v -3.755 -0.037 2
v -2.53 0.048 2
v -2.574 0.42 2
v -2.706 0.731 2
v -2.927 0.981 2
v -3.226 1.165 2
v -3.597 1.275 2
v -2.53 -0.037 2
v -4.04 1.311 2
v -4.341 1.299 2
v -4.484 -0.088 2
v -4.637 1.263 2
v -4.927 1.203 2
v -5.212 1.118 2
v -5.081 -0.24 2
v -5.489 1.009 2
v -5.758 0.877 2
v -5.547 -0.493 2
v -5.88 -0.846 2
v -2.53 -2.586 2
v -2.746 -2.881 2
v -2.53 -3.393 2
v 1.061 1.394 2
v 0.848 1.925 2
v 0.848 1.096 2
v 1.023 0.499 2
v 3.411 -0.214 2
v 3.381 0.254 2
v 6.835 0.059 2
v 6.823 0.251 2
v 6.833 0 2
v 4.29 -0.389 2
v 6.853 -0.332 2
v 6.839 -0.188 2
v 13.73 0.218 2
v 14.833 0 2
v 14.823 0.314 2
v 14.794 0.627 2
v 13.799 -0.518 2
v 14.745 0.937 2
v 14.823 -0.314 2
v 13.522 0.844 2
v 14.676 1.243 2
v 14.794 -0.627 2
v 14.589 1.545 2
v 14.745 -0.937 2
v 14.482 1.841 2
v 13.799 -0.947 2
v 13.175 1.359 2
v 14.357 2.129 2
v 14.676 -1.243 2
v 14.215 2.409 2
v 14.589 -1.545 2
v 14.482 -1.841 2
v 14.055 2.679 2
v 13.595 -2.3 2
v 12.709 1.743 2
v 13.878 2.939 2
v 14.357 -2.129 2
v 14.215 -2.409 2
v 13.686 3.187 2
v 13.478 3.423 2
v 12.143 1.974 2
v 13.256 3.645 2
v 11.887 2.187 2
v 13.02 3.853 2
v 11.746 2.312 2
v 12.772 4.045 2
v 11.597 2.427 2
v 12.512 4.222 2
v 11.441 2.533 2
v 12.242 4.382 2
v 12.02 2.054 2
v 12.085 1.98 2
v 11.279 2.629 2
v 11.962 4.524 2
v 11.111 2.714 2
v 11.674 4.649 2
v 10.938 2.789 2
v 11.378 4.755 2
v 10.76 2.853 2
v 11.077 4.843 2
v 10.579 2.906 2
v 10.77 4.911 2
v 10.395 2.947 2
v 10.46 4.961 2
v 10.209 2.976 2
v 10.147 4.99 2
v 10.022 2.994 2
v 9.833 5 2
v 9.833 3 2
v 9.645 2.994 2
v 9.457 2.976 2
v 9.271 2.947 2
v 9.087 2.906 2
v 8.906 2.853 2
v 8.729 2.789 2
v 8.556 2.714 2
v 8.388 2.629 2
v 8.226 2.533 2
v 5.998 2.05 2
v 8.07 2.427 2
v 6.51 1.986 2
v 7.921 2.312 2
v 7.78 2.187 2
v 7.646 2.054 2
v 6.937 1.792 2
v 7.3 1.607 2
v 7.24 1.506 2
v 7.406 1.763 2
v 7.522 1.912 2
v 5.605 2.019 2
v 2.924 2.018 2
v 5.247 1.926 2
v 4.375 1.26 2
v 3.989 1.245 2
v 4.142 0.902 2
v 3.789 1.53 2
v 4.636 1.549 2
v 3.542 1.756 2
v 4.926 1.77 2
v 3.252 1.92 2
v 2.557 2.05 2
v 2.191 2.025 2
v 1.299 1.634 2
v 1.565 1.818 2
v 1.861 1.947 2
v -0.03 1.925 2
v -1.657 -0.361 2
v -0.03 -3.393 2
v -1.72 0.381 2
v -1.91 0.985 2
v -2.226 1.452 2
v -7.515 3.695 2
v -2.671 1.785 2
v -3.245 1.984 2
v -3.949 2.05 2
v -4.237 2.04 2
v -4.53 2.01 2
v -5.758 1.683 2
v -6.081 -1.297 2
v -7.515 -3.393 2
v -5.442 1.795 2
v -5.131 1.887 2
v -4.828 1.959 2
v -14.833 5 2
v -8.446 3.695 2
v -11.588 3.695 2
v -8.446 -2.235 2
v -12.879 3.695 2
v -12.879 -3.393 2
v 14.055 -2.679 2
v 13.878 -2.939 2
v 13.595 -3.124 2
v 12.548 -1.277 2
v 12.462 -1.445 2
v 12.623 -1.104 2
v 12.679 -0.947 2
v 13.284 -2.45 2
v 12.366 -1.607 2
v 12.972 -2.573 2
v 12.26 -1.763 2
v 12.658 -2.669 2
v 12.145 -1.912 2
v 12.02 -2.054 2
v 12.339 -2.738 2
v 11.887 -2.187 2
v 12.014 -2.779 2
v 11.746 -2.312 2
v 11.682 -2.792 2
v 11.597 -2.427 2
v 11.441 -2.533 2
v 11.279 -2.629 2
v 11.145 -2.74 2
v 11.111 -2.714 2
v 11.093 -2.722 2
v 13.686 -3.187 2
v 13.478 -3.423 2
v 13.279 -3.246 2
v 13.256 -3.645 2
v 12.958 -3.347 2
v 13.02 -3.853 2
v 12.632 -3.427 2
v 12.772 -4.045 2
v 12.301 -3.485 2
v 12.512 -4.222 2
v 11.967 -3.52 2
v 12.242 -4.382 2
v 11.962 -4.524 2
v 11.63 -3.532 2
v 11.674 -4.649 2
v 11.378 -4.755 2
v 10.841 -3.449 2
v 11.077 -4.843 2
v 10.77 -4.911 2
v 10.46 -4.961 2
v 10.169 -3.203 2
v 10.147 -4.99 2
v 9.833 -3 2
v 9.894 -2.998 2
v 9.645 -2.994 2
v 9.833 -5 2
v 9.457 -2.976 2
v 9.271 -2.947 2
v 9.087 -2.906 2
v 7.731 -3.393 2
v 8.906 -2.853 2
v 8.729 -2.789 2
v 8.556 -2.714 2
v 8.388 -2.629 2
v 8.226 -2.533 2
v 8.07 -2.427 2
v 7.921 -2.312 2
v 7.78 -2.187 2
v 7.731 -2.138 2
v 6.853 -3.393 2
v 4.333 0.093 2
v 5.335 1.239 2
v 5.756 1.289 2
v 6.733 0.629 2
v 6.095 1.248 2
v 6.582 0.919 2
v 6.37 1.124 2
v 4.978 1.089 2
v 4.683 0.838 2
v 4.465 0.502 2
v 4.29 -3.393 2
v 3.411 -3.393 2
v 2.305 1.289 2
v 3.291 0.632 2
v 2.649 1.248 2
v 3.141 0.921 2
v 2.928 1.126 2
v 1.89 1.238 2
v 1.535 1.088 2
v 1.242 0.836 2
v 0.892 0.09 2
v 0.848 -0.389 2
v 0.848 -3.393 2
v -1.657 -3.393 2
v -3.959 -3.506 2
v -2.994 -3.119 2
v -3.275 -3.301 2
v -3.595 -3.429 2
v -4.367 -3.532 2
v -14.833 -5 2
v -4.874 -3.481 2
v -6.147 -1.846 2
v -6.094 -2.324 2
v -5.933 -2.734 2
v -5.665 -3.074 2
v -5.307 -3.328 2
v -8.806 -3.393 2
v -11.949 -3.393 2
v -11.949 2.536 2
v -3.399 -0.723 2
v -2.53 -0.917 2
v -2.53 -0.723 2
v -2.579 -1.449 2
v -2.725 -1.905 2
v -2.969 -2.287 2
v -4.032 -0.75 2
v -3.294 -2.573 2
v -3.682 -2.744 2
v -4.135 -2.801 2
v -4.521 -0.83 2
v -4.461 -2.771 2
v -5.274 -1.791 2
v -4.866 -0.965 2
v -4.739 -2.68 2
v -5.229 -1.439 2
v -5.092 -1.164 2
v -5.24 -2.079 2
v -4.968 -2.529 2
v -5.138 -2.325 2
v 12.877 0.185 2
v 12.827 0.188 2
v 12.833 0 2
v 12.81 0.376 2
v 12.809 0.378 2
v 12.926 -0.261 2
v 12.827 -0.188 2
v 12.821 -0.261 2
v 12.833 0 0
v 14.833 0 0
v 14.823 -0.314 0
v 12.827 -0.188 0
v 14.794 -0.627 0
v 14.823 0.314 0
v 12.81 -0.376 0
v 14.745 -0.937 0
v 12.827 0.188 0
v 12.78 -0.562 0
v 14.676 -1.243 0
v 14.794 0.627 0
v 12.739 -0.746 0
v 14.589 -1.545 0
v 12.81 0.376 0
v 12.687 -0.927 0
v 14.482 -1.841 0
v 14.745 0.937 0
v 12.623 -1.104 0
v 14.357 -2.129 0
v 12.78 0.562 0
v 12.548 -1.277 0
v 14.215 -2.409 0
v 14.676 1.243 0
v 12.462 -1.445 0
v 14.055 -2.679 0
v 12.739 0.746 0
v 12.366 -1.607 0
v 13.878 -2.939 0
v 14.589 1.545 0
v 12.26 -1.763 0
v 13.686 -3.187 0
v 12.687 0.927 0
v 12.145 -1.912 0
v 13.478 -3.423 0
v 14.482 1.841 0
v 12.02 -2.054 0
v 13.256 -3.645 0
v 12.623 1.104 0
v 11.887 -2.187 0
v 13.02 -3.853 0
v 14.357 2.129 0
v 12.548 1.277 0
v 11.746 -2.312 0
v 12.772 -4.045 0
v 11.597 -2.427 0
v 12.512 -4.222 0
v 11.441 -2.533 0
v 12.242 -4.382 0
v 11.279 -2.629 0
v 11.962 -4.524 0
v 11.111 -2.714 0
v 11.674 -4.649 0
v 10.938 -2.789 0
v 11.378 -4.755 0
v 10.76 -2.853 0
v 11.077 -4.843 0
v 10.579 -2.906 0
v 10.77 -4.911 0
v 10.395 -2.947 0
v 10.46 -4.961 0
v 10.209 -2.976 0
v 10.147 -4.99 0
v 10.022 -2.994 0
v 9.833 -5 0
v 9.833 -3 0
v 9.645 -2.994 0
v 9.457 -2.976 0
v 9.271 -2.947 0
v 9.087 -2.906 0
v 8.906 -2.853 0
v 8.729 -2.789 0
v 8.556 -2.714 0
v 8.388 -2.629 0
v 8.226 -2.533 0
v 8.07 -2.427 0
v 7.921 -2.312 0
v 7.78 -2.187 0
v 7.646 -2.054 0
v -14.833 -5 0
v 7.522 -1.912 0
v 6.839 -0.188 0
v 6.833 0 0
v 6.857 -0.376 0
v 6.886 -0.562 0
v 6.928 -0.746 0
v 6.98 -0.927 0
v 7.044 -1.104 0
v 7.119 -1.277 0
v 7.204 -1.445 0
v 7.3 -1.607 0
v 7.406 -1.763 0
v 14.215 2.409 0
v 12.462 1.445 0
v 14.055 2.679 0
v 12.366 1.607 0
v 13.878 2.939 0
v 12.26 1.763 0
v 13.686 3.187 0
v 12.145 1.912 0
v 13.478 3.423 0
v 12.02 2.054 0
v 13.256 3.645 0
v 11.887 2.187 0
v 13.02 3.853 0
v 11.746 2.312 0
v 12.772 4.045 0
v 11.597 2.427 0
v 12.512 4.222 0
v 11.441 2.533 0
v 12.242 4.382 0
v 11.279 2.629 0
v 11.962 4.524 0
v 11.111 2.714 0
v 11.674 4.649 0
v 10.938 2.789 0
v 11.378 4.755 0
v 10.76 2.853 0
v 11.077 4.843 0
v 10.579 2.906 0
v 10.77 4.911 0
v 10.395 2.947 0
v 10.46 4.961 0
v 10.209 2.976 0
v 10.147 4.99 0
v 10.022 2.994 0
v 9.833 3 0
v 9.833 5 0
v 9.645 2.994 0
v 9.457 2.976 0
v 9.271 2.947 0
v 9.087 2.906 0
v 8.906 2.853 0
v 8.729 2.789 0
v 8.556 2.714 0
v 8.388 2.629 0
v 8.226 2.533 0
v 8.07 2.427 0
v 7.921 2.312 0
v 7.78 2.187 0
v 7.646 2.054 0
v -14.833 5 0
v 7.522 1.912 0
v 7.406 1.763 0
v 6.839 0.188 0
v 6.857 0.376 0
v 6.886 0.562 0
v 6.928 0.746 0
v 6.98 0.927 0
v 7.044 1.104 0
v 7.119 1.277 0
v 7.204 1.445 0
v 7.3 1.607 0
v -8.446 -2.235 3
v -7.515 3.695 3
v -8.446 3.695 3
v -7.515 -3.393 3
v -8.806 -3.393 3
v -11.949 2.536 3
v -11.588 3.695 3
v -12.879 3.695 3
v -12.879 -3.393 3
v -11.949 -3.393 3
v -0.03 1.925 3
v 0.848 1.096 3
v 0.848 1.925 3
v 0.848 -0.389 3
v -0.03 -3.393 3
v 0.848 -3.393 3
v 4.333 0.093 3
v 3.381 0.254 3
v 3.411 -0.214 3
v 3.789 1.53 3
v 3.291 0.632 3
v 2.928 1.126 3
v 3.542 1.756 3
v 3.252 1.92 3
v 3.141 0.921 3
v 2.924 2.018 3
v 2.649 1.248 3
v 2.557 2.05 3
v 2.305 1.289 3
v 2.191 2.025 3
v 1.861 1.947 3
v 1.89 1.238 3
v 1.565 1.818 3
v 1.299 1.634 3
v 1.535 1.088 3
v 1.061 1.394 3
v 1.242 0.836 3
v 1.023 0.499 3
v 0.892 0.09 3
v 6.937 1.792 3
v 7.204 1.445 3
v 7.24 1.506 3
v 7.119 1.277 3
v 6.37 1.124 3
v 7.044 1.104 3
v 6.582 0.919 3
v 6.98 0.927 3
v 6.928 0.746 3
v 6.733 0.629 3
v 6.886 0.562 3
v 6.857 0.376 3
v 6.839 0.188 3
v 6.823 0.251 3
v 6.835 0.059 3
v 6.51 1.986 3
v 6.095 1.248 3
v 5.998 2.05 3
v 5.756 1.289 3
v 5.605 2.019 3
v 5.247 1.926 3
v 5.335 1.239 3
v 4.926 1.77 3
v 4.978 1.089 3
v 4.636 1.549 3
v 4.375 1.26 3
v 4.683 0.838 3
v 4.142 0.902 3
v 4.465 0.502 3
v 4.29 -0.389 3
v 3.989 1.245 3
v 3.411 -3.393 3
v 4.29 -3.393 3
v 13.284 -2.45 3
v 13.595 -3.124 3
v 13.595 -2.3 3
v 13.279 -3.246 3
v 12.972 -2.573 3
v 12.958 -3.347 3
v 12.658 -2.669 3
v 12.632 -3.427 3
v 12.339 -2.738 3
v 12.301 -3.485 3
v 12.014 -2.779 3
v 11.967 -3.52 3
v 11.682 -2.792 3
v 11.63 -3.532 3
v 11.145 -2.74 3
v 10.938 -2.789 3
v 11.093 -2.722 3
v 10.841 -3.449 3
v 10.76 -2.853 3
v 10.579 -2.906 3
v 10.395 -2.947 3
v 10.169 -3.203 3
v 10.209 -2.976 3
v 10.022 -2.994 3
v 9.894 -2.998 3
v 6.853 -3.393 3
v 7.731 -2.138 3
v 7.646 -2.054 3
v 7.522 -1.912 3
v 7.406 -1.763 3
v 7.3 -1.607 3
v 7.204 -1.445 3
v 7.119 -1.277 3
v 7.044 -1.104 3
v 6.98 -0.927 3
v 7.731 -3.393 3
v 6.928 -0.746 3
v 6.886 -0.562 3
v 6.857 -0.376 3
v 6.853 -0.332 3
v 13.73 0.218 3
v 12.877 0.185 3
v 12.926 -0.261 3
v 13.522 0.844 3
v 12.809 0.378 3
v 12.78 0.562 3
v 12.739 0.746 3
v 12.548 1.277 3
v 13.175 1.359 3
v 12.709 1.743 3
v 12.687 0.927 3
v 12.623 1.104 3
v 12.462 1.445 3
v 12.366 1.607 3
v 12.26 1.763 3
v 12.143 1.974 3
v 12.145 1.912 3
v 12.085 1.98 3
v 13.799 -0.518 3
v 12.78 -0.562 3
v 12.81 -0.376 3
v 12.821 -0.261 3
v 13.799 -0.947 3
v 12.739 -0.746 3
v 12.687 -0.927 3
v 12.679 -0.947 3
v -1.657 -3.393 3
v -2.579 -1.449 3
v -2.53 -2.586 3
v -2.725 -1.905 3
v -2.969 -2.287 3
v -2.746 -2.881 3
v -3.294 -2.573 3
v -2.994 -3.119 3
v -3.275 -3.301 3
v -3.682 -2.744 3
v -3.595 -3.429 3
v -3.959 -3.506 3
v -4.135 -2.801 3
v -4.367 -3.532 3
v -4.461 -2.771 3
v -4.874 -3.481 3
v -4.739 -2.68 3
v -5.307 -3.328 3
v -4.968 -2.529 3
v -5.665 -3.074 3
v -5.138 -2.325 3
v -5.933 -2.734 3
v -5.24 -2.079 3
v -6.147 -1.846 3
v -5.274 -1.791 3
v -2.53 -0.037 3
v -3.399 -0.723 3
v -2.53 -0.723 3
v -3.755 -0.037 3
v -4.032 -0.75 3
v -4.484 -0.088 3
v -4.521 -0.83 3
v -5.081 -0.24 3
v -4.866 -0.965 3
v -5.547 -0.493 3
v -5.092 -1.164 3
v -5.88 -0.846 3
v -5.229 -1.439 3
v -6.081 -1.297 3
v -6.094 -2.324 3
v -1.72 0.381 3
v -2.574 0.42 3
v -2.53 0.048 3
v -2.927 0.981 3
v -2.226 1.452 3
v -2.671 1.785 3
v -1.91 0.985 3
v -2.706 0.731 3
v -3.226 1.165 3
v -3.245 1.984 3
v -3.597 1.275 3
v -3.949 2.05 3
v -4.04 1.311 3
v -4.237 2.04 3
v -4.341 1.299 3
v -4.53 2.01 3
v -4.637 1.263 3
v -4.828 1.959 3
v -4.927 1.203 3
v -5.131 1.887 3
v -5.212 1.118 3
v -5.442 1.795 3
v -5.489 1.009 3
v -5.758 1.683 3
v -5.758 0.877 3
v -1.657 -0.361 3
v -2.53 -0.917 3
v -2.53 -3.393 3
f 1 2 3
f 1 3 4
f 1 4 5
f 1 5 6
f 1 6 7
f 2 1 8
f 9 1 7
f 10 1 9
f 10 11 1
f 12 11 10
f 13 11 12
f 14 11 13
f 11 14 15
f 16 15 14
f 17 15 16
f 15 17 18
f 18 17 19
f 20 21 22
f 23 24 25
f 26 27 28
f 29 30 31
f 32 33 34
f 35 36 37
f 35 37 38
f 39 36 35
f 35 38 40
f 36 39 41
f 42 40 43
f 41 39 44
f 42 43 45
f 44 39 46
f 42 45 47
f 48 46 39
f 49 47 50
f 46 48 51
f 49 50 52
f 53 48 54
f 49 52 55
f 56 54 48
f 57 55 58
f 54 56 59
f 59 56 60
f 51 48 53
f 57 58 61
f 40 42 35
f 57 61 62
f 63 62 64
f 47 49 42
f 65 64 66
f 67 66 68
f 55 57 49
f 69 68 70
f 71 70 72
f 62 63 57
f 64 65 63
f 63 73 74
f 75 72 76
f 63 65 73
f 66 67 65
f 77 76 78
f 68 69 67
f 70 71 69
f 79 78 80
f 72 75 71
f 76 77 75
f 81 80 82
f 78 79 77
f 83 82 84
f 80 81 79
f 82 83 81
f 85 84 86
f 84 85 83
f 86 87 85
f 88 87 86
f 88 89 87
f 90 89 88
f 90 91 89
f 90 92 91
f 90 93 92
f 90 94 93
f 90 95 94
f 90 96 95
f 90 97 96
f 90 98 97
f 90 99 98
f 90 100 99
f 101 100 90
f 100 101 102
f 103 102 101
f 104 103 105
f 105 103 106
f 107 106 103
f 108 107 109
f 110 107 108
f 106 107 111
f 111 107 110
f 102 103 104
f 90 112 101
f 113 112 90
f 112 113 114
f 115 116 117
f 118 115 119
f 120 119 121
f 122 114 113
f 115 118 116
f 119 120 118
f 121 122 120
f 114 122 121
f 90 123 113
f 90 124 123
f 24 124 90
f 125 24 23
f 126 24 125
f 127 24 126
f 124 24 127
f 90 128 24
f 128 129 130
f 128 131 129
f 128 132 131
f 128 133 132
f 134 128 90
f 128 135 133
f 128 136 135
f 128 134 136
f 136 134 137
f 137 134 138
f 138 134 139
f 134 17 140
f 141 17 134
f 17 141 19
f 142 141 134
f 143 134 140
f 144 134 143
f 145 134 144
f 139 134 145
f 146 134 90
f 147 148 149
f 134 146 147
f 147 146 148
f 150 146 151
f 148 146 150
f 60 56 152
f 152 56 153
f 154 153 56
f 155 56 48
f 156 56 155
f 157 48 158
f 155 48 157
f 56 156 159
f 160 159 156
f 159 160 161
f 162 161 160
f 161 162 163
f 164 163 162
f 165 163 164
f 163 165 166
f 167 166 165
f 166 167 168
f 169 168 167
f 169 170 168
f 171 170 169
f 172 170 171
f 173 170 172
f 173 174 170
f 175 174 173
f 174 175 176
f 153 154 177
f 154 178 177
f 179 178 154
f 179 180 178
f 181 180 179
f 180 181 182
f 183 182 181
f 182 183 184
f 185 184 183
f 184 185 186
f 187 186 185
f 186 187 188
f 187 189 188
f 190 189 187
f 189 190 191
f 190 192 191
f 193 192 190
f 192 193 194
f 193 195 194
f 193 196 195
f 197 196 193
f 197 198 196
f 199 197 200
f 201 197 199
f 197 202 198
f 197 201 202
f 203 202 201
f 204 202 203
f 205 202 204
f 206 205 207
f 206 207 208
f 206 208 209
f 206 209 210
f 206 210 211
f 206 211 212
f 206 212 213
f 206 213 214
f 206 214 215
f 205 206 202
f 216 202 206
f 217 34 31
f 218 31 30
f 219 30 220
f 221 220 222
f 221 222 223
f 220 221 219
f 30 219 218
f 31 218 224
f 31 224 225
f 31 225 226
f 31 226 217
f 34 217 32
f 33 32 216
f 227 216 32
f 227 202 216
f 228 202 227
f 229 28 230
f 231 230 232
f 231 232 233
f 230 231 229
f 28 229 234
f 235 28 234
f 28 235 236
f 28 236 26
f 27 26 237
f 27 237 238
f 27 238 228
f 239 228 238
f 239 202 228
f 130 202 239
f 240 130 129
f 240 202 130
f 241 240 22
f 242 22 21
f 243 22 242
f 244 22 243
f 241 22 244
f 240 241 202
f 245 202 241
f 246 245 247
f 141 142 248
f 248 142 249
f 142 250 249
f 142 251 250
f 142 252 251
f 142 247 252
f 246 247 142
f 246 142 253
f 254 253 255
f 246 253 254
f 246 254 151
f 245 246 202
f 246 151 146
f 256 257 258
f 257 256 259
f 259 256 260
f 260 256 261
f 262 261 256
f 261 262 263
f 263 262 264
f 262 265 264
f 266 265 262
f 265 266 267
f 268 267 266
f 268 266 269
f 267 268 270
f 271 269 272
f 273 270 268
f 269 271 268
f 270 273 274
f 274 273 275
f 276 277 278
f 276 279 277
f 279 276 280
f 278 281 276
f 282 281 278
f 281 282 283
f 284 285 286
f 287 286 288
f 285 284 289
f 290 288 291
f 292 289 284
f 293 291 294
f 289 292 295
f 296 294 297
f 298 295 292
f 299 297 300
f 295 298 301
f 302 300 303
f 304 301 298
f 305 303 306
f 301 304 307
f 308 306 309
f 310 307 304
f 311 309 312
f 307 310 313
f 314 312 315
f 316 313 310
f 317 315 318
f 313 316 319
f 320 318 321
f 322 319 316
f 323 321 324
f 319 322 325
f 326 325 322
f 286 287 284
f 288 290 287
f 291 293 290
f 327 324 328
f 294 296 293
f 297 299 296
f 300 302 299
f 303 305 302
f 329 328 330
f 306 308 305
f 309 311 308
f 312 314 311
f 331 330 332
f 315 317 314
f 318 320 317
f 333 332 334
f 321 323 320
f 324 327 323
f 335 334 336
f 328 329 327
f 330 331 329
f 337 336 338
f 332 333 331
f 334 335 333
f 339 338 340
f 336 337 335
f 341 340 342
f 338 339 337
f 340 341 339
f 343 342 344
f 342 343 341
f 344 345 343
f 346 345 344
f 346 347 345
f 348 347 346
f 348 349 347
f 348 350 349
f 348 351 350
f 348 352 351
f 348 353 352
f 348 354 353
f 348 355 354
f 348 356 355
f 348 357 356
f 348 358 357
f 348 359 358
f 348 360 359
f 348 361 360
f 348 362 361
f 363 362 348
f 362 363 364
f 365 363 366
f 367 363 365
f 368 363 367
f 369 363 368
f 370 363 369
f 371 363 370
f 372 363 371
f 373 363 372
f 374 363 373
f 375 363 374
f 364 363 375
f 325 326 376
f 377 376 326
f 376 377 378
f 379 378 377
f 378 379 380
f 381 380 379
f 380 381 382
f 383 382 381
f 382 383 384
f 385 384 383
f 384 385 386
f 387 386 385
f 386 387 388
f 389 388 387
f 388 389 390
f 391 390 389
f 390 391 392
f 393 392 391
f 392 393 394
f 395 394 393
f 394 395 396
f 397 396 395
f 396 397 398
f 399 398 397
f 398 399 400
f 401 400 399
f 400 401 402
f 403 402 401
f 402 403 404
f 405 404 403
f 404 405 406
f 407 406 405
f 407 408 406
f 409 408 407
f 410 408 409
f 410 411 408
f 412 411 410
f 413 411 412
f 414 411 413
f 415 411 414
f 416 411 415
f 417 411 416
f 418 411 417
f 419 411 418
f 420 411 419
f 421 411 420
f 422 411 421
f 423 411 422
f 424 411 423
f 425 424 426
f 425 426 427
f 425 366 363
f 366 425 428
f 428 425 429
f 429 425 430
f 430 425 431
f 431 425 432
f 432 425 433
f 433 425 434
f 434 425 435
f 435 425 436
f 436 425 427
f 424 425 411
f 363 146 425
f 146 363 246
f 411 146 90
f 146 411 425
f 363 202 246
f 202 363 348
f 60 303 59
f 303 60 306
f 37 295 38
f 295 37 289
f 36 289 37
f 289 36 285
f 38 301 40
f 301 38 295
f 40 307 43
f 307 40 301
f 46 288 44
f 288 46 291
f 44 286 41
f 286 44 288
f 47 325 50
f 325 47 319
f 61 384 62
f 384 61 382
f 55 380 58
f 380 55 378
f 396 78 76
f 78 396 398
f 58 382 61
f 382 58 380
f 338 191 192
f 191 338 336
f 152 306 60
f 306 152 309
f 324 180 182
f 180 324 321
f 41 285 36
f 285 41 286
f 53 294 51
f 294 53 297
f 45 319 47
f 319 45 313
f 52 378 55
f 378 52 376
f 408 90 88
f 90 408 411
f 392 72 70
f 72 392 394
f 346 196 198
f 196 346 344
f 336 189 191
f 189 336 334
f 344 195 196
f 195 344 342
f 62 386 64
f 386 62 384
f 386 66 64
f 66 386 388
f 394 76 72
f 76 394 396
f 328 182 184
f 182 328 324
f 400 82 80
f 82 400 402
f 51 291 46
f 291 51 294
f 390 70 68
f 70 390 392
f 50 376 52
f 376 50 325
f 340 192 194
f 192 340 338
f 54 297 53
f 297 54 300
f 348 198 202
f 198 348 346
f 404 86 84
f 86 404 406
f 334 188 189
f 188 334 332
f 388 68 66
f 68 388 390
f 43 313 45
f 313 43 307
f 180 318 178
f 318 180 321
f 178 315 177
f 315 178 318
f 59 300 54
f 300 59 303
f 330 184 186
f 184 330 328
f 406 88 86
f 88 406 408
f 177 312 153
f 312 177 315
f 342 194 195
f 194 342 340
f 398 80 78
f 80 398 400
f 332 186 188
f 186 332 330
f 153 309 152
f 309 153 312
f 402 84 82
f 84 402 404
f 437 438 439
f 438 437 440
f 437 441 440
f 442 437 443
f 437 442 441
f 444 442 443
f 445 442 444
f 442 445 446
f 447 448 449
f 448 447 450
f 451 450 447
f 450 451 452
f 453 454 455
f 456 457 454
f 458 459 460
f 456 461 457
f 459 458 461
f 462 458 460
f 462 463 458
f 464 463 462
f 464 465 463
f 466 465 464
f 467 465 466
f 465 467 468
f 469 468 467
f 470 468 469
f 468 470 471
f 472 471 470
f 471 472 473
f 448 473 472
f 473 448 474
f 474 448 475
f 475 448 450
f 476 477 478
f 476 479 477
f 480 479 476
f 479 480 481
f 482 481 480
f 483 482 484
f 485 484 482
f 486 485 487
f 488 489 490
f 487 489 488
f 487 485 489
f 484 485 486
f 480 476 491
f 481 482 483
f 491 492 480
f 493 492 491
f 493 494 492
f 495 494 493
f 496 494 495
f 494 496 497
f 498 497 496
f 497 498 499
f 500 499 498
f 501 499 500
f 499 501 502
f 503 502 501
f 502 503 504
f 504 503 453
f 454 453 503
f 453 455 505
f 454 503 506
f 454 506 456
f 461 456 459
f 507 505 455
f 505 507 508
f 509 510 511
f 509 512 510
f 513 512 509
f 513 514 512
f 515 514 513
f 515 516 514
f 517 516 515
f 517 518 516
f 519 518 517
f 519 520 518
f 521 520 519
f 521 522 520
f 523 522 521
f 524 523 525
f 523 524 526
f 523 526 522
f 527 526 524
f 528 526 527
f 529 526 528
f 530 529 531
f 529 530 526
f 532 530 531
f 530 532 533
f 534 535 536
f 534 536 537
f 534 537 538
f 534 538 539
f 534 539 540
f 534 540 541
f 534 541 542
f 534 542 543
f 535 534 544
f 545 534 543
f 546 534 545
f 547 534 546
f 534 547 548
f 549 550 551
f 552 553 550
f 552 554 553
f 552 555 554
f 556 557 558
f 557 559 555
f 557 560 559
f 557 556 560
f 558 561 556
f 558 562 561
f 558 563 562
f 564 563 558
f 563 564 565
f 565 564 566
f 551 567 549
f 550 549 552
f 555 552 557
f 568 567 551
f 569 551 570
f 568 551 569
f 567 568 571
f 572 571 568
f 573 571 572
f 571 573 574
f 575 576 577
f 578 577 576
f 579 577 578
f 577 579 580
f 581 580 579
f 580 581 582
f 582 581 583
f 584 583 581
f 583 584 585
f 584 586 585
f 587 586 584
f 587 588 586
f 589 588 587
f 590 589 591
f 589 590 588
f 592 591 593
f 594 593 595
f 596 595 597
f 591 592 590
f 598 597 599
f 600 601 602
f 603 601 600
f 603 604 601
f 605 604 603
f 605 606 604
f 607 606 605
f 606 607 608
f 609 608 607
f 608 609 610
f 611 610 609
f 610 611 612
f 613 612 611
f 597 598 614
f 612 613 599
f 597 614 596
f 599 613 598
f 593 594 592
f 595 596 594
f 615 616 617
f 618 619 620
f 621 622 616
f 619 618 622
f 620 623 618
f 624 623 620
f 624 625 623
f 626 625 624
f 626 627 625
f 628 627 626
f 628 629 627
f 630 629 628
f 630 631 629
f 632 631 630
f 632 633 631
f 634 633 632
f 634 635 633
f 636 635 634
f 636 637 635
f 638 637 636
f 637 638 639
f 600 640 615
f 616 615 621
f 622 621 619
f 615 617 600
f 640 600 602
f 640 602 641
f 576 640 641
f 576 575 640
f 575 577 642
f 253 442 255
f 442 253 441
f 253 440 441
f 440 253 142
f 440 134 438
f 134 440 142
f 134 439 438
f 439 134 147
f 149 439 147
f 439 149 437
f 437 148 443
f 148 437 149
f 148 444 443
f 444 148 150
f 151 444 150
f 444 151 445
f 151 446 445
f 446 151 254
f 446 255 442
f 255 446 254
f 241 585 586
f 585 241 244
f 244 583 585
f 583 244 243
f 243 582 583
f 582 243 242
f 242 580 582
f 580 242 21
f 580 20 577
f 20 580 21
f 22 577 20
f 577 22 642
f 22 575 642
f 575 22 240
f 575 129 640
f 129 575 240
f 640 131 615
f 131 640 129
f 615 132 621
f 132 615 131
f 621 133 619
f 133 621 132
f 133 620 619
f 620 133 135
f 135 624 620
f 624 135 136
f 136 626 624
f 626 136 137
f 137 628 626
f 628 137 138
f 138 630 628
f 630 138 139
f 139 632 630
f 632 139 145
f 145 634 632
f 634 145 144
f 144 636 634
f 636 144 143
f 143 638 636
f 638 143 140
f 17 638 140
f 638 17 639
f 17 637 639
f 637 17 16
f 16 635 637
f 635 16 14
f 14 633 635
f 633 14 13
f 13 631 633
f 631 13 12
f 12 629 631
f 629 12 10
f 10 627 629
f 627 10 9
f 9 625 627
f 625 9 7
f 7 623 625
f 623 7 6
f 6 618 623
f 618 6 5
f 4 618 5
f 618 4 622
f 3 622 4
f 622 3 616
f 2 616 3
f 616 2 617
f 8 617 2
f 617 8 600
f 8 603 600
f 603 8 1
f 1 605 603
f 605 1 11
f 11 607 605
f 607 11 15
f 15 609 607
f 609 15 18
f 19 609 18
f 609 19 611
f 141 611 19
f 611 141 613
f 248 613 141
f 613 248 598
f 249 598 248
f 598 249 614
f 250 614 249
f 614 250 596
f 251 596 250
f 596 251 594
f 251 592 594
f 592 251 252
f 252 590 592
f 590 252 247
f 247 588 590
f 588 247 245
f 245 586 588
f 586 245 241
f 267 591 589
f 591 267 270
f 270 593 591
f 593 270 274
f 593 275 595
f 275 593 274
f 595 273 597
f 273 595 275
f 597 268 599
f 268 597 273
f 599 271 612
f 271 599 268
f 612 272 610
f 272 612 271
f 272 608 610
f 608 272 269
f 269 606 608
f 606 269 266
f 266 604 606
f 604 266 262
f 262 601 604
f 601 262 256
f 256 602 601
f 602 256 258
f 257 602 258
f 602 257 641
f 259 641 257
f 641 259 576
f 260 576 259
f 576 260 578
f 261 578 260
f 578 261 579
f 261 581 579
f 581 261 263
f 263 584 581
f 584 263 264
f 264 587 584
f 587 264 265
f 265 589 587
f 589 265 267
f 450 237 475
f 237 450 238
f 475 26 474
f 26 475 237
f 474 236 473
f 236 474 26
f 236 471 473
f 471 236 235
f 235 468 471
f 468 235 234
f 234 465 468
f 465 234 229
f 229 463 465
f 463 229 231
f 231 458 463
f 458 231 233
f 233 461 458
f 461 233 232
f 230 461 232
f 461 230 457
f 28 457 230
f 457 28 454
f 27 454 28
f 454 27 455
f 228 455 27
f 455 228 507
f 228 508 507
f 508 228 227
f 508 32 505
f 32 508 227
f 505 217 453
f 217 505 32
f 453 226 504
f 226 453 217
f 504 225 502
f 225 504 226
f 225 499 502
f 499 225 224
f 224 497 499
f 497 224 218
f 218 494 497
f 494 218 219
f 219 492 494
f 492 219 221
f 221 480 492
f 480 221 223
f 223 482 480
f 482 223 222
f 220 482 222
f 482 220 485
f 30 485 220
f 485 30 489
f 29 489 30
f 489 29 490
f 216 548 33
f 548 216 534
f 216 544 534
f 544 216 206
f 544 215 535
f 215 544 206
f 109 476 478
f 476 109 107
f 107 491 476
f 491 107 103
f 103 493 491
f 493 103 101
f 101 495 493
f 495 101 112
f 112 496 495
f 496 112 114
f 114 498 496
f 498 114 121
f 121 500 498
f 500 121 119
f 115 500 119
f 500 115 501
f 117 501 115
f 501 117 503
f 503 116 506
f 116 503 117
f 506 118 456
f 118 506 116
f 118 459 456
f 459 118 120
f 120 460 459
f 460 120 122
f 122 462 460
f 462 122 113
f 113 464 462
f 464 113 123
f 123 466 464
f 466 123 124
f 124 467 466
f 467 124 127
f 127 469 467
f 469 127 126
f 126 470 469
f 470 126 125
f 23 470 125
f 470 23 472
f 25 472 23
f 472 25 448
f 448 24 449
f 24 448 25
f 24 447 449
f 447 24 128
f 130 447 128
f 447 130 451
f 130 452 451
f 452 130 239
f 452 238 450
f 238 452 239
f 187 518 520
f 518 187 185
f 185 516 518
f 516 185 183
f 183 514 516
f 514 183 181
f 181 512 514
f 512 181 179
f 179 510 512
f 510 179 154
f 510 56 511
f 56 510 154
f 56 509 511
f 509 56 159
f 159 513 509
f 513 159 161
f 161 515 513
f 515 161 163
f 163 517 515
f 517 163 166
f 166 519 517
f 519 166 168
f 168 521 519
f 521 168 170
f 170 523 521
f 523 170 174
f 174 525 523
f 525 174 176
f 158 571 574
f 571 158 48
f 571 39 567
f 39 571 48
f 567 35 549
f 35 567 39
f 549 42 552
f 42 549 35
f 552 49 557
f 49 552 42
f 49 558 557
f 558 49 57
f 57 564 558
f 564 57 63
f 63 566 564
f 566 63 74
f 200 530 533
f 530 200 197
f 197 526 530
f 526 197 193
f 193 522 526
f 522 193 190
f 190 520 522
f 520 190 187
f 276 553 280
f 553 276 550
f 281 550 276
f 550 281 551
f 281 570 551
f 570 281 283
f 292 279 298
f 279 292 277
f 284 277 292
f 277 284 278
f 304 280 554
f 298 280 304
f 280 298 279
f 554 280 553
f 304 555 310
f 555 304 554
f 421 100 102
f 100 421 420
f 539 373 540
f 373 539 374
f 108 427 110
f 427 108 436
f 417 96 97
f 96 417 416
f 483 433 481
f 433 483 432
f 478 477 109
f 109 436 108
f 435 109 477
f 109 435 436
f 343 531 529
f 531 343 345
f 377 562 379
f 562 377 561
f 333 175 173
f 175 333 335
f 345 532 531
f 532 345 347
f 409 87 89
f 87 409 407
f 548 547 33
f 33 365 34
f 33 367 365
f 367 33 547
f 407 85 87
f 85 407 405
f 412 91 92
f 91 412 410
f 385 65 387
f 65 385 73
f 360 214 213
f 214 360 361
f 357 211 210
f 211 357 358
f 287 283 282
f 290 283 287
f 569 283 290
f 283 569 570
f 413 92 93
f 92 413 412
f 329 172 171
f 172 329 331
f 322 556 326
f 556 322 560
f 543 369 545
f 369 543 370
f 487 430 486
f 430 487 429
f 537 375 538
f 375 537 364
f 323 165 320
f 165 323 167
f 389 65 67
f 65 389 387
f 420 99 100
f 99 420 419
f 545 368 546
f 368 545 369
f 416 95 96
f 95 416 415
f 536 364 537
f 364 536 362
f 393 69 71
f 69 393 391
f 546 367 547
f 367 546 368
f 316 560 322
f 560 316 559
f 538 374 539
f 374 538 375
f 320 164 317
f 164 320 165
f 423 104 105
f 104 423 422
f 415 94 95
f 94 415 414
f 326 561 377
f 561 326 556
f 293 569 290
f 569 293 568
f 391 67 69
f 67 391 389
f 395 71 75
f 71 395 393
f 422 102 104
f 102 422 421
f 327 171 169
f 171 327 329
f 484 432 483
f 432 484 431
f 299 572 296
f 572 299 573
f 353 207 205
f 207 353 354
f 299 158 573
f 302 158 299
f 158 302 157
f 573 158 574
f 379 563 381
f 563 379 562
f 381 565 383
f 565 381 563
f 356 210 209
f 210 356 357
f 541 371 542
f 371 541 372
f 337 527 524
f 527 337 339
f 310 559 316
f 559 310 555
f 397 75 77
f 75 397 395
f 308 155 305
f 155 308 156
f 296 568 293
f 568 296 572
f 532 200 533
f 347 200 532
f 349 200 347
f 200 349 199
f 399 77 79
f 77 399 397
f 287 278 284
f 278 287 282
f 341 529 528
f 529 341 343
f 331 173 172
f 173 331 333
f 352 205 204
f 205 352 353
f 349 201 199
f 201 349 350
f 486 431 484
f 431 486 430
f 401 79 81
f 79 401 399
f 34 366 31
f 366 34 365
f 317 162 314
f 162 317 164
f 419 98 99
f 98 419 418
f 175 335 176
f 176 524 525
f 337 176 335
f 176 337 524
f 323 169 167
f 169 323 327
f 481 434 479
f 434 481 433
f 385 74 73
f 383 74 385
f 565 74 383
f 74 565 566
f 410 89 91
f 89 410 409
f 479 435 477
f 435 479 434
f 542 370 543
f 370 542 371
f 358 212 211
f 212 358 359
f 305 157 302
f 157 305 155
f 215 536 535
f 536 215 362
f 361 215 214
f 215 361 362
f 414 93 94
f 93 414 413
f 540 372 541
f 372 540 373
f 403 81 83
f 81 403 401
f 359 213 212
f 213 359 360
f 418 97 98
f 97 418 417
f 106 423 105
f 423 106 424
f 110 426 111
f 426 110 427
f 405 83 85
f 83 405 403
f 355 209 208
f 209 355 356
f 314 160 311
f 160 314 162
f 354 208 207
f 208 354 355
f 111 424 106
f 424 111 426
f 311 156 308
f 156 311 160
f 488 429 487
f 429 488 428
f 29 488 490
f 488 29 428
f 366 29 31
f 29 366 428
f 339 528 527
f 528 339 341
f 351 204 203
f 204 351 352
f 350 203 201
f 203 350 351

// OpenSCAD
// Name plate generator. Feel free to edit any of the values!

// Your name
name = "Name";
chars = 4;

// The thicknes of the text (Amount text sticks up by)
textthick = 1;
// The height of the text, if looking down from the top
textheight = 7;

// Lenght of the flat part
length = (textheight*(2/3))*chars+1;
// Width of the flat part
width = 10;
// Thickness of the flat part
thickness = 2;

translate([-(length+width)/2, -width/2, 0]){
	difference(){
		union(){
			// Make the flat part
			cube([length + width/2, width, thickness]);
			
			translate([length + width/2, width/2, 0]){
				cylinder(r=width/2, h=thickness, $fn=100);
			}
			
			//Move above the flat part
			translate([1, width/2, thickness]){
				// Make the text 3d
				color("yellow") linear_extrude(textthick, convexity=10){
					// Draw the text
					text(name, textheight, valign="center", font="Ubuntu Mono, Bold");
				}
			}
		}
		
		translate([length + width/2, width/2, -1]){
			cylinder(r=width/2-thickness, h=thickness+2, $fn=100);
		}
	}
}
